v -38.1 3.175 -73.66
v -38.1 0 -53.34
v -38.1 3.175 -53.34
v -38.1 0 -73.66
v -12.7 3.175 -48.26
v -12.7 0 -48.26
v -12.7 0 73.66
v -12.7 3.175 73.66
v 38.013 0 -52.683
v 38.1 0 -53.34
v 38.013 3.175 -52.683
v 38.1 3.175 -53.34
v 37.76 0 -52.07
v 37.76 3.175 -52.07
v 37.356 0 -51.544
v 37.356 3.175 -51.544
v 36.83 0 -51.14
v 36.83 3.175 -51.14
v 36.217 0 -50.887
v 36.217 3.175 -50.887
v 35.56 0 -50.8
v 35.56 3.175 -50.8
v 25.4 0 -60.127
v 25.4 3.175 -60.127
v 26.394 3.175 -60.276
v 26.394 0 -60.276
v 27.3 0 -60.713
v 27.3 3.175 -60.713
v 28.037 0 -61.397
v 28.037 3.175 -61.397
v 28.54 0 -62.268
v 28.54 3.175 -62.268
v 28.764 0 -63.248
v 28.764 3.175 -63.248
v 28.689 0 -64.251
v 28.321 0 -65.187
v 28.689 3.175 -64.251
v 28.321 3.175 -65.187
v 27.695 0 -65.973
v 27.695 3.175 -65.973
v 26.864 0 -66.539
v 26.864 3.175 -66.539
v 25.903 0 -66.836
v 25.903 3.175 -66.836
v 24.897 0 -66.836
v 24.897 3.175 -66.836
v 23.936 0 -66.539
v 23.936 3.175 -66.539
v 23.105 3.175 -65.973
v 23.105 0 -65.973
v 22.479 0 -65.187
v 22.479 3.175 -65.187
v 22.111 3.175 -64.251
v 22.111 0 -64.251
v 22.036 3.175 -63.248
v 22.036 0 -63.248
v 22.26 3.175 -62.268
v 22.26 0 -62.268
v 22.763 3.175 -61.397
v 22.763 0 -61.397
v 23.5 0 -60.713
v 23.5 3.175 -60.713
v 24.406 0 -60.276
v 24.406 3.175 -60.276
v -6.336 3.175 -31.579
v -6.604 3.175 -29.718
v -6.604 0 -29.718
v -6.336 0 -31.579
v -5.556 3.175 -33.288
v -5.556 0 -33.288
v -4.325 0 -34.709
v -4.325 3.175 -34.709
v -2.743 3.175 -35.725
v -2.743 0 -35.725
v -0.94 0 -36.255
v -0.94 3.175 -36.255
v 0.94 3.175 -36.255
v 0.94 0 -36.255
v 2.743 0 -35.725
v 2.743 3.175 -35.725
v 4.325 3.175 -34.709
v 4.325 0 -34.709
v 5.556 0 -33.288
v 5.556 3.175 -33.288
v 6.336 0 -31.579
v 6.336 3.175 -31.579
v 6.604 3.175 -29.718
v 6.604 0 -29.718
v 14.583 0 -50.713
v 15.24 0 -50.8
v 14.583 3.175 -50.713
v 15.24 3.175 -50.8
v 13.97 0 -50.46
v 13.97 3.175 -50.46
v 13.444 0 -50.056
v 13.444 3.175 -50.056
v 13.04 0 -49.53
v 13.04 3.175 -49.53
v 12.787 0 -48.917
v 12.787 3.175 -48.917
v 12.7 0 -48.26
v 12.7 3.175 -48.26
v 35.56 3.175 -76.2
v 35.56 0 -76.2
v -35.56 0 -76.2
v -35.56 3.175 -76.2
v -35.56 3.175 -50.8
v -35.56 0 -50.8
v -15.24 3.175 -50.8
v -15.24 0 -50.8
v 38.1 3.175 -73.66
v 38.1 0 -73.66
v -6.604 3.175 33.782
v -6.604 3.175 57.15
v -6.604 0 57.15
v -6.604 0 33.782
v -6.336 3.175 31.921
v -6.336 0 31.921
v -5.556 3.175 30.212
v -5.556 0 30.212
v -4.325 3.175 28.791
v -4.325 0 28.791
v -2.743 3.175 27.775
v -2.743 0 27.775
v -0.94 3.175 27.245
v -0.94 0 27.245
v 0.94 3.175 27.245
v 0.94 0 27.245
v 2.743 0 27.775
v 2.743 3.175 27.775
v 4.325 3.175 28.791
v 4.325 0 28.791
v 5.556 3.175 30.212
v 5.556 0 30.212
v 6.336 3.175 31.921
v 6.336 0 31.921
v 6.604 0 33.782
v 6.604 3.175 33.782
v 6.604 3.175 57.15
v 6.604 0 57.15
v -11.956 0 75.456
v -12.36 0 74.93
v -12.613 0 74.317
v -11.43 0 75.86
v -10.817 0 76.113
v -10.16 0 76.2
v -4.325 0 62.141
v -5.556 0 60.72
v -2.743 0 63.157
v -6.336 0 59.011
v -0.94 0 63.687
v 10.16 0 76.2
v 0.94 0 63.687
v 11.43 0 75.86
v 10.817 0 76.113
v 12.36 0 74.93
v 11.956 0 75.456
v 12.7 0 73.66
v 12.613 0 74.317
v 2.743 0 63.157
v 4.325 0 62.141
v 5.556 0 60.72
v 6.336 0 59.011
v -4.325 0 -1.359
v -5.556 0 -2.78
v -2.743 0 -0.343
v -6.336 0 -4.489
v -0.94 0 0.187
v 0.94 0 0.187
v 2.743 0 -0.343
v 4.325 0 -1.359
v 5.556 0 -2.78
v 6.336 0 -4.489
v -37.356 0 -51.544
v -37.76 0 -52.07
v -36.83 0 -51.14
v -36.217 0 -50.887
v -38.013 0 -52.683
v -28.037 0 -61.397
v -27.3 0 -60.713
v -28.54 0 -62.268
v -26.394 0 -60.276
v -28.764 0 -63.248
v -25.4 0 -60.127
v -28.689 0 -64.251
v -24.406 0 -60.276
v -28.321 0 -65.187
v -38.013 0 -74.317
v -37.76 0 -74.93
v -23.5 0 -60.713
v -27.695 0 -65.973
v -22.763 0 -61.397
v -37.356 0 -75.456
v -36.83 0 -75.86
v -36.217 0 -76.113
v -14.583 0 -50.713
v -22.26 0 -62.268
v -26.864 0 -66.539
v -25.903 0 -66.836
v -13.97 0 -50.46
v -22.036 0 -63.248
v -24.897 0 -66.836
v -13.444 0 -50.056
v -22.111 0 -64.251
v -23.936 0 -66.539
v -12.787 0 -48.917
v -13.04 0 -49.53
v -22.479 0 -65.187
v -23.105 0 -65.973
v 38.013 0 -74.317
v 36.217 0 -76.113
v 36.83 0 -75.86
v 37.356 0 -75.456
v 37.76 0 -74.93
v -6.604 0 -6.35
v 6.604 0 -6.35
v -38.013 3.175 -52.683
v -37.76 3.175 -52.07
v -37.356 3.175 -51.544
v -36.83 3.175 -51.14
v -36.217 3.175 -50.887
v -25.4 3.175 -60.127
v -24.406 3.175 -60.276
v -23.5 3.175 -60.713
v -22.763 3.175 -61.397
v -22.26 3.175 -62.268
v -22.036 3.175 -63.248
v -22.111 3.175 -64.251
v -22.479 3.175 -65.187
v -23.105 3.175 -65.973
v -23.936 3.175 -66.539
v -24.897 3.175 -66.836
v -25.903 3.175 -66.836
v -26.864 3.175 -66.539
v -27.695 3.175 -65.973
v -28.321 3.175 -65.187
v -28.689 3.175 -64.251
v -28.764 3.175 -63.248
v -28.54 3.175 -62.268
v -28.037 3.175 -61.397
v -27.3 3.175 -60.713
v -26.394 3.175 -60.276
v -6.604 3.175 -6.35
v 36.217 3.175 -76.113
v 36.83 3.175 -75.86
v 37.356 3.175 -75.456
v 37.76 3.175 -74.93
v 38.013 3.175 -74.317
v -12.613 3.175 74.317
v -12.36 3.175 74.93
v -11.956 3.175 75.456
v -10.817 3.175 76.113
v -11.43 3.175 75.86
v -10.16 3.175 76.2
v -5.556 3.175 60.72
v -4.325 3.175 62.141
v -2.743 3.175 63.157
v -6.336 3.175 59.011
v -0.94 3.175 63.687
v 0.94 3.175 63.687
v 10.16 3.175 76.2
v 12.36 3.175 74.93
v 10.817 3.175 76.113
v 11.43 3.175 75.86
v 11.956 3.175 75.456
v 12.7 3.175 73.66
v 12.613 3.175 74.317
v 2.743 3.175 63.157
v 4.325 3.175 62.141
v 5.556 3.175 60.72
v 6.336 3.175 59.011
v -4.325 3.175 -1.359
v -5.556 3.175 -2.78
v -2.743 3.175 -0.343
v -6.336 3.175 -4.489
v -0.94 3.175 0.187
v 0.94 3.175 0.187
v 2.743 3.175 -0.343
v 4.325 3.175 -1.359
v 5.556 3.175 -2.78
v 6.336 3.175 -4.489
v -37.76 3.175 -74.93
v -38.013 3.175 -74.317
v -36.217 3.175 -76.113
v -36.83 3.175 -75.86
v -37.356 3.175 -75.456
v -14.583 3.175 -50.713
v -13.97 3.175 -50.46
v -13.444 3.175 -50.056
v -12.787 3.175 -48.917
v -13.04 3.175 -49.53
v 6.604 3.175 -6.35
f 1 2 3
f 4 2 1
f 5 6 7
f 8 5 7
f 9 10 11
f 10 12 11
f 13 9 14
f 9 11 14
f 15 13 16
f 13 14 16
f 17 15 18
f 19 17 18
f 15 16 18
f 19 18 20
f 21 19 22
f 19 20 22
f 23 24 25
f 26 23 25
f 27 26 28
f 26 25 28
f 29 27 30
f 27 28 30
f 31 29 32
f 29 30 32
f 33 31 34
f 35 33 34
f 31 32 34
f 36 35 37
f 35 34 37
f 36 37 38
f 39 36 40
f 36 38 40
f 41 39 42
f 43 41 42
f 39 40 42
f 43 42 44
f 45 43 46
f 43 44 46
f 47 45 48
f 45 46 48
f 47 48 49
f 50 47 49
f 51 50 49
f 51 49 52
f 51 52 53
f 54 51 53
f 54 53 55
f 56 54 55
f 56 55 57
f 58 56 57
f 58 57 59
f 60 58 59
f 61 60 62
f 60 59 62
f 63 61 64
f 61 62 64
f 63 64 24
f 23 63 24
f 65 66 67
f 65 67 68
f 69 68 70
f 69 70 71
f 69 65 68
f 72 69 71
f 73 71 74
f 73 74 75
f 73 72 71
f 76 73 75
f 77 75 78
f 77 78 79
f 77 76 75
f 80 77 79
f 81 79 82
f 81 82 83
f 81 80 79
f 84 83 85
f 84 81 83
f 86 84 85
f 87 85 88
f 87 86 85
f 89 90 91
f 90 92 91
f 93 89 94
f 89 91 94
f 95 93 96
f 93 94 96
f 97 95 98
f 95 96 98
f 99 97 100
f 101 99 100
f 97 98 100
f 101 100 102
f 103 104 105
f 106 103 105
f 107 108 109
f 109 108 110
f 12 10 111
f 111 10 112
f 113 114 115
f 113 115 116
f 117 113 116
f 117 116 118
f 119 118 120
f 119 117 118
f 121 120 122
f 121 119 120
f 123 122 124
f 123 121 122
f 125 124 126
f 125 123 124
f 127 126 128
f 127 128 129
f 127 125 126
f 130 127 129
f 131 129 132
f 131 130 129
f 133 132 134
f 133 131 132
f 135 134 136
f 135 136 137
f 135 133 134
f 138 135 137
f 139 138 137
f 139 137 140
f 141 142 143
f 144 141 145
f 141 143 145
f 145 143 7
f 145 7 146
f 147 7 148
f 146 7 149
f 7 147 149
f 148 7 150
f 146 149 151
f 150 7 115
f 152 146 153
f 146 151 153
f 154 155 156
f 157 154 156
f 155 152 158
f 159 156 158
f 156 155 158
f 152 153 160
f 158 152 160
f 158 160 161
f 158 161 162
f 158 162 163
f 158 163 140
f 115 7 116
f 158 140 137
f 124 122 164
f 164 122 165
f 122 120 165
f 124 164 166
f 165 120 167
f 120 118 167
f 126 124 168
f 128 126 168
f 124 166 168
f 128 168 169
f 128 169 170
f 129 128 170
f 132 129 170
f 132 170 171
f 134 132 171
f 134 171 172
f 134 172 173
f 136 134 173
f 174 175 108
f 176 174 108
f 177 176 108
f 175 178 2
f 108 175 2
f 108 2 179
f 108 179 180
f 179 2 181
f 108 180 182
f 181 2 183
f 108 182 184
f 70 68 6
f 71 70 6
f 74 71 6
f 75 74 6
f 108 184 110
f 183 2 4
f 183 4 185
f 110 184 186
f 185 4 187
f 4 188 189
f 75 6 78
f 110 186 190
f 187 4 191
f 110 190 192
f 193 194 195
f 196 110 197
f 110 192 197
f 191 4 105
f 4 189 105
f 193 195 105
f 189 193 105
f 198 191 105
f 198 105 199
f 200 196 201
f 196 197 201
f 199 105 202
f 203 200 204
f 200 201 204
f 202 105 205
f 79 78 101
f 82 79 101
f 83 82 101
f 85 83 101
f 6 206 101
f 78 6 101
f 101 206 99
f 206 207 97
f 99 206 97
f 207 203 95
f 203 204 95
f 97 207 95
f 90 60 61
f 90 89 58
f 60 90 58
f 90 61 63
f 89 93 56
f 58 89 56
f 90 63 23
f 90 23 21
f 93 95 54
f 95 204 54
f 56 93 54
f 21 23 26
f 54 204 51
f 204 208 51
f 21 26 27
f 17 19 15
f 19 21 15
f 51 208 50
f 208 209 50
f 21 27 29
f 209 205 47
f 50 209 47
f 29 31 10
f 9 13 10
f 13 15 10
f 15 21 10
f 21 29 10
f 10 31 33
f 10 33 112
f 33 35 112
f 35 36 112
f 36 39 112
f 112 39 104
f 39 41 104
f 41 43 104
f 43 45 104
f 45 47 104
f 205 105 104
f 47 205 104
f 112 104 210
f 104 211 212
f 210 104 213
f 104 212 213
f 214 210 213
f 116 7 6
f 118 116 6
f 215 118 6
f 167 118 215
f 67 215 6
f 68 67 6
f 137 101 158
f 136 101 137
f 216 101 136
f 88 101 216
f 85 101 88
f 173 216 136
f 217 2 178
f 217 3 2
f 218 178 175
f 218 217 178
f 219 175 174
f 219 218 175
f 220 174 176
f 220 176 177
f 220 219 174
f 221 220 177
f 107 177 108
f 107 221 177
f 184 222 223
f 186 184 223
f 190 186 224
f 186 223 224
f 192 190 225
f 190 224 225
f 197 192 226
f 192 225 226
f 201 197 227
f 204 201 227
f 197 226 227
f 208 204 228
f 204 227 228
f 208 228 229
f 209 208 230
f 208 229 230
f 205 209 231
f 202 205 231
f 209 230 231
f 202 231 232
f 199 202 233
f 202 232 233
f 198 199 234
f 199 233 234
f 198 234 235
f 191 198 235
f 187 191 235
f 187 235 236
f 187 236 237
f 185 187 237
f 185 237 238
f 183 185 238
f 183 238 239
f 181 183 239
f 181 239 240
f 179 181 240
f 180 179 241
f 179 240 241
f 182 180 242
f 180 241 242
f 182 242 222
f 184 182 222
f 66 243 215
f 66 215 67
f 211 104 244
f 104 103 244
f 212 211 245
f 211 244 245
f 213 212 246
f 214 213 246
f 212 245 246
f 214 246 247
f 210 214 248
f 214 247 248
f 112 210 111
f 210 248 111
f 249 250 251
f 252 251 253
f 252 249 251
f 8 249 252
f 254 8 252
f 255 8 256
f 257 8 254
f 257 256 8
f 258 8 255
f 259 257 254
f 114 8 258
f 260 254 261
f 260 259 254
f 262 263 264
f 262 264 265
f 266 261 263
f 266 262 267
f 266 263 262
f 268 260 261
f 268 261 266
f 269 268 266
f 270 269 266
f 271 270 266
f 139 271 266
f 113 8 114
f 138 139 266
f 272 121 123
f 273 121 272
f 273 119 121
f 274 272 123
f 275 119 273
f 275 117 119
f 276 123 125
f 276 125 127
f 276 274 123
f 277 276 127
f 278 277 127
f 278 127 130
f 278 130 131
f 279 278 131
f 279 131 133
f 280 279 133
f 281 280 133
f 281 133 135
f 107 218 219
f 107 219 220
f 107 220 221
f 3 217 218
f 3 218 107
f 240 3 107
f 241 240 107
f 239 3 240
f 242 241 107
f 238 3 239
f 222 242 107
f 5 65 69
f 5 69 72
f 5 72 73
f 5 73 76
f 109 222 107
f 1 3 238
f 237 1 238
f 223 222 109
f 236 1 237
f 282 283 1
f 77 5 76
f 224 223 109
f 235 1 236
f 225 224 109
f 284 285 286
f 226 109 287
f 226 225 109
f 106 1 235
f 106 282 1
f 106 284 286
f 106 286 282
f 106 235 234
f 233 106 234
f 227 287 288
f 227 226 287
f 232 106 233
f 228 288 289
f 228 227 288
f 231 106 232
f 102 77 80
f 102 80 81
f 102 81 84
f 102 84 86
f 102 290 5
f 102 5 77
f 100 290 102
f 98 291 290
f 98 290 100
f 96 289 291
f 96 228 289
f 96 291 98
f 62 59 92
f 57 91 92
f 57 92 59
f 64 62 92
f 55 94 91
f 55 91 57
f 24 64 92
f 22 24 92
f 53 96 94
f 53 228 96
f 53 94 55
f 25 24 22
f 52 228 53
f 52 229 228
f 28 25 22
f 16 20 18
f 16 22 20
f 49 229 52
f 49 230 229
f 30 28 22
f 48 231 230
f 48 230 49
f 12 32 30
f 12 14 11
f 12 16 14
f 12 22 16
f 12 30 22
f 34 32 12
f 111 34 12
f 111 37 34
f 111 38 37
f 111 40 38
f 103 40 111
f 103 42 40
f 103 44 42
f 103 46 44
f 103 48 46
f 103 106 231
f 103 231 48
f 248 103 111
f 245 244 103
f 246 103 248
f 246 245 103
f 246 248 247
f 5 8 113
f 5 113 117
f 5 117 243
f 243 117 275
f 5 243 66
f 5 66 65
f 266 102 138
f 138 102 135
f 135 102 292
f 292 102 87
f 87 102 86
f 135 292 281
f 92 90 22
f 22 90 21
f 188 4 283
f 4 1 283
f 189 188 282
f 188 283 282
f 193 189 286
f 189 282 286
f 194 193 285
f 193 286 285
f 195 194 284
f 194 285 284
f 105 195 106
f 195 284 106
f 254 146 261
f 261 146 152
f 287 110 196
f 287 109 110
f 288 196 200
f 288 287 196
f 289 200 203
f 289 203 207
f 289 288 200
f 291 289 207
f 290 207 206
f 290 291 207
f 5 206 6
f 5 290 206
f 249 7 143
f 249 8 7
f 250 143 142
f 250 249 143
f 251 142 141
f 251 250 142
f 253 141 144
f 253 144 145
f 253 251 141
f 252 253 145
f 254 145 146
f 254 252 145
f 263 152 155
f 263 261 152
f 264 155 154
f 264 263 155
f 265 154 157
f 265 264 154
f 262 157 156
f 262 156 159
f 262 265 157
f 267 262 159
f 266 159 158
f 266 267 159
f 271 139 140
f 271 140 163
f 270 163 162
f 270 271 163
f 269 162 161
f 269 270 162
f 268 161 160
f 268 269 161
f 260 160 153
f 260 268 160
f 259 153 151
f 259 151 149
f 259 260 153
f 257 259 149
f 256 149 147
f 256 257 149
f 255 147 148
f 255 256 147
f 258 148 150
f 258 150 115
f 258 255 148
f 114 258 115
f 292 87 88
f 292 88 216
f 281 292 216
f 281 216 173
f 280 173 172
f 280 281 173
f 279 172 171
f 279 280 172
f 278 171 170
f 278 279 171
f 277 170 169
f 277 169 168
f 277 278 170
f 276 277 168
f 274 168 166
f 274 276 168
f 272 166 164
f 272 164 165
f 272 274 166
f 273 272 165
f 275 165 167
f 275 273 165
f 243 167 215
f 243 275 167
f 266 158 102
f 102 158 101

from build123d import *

# Parameters (mm, degrees)
SKETCH1_W           = 25.4
SKETCH1_H           = 25.4
BOSS_EXTRUDE1_DEPTH = 3.175
SKETCH2_R           = 3.3734375
CUT_EXTRUDE1_DEPTH  = 3.175
FILLET1_R           = 2.54


with BuildPart() as part:
    # Sketch1 → Boss-Extrude1 (new body)
    with BuildSketch(Plane(origin=(0, 0, 0), x_dir=(1, 0, 0), z_dir=(0, 1, 0))):
        with Locations((-25.4, 63.5)):
            Rectangle(SKETCH1_W, SKETCH1_H)
        Polygon((-12.7, -76.2), (12.7, -76.2), (12.7, 50.8), (12.7, 76.2), (-12.7, 76.2), (-12.7, 50.8), align=None)
        with Locations((25.4, 63.5)):
            Rectangle(SKETCH1_W, SKETCH1_H)
    extrude(amount=BOSS_EXTRUDE1_DEPTH)

    # Sketch2 → Cut-Extrude1 (cut)
    with BuildSketch(Plane(origin=(0, 3.175, 0), x_dir=(1, 0, 0), z_dir=(0, 1, 0))):
        with Locations(Location((-25.4, 63.5, 0), (0, 0, 270))):
            Circle(SKETCH2_R)
        with Locations(Location((25.4, 63.5, 0), (0, 0, 270))):
            Circle(SKETCH2_R)
        with BuildLine():
            Line((6.604, 29.718), (6.604, 6.35))
            ThreePointArc((6.604, 6.35), (0, -0.254), (-6.604, 6.35))
            Line((-6.604, 6.35), (-6.604, 29.718))
            ThreePointArc((-6.604, 29.718), (0, 36.322), (6.604, 29.718))
        make_face()
        with BuildLine():
            Line((6.604, -33.782), (6.604, -57.15))
            ThreePointArc((6.604, -57.15), (0, -63.754), (-6.604, -57.15))
            Line((-6.604, -57.15), (-6.604, -33.782))
            ThreePointArc((-6.604, -33.782), (0, -27.178), (6.604, -33.782))
        make_face()
    extrude(amount=-CUT_EXTRUDE1_DEPTH, mode=Mode.SUBTRACT)

    # Fillet1
    fillet1_edges = [part.edges().sort_by_distance(p)[0] for p in [
        (38.1, 1.5875, -76.2),
        (38.1, 1.5875, -50.8),
        (12.7, 1.5875, -50.8),
        (12.7, 1.5875, 76.2),
        (-12.7, 1.5875, 76.2),
        (-12.7, 1.5875, -50.8),
        (-38.1, 1.5875, -50.8),
        (-38.1, 1.5875, -76.2),
    ]]
    fillet(fillet1_edges, radius=FILLET1_R)


solid = part.part
